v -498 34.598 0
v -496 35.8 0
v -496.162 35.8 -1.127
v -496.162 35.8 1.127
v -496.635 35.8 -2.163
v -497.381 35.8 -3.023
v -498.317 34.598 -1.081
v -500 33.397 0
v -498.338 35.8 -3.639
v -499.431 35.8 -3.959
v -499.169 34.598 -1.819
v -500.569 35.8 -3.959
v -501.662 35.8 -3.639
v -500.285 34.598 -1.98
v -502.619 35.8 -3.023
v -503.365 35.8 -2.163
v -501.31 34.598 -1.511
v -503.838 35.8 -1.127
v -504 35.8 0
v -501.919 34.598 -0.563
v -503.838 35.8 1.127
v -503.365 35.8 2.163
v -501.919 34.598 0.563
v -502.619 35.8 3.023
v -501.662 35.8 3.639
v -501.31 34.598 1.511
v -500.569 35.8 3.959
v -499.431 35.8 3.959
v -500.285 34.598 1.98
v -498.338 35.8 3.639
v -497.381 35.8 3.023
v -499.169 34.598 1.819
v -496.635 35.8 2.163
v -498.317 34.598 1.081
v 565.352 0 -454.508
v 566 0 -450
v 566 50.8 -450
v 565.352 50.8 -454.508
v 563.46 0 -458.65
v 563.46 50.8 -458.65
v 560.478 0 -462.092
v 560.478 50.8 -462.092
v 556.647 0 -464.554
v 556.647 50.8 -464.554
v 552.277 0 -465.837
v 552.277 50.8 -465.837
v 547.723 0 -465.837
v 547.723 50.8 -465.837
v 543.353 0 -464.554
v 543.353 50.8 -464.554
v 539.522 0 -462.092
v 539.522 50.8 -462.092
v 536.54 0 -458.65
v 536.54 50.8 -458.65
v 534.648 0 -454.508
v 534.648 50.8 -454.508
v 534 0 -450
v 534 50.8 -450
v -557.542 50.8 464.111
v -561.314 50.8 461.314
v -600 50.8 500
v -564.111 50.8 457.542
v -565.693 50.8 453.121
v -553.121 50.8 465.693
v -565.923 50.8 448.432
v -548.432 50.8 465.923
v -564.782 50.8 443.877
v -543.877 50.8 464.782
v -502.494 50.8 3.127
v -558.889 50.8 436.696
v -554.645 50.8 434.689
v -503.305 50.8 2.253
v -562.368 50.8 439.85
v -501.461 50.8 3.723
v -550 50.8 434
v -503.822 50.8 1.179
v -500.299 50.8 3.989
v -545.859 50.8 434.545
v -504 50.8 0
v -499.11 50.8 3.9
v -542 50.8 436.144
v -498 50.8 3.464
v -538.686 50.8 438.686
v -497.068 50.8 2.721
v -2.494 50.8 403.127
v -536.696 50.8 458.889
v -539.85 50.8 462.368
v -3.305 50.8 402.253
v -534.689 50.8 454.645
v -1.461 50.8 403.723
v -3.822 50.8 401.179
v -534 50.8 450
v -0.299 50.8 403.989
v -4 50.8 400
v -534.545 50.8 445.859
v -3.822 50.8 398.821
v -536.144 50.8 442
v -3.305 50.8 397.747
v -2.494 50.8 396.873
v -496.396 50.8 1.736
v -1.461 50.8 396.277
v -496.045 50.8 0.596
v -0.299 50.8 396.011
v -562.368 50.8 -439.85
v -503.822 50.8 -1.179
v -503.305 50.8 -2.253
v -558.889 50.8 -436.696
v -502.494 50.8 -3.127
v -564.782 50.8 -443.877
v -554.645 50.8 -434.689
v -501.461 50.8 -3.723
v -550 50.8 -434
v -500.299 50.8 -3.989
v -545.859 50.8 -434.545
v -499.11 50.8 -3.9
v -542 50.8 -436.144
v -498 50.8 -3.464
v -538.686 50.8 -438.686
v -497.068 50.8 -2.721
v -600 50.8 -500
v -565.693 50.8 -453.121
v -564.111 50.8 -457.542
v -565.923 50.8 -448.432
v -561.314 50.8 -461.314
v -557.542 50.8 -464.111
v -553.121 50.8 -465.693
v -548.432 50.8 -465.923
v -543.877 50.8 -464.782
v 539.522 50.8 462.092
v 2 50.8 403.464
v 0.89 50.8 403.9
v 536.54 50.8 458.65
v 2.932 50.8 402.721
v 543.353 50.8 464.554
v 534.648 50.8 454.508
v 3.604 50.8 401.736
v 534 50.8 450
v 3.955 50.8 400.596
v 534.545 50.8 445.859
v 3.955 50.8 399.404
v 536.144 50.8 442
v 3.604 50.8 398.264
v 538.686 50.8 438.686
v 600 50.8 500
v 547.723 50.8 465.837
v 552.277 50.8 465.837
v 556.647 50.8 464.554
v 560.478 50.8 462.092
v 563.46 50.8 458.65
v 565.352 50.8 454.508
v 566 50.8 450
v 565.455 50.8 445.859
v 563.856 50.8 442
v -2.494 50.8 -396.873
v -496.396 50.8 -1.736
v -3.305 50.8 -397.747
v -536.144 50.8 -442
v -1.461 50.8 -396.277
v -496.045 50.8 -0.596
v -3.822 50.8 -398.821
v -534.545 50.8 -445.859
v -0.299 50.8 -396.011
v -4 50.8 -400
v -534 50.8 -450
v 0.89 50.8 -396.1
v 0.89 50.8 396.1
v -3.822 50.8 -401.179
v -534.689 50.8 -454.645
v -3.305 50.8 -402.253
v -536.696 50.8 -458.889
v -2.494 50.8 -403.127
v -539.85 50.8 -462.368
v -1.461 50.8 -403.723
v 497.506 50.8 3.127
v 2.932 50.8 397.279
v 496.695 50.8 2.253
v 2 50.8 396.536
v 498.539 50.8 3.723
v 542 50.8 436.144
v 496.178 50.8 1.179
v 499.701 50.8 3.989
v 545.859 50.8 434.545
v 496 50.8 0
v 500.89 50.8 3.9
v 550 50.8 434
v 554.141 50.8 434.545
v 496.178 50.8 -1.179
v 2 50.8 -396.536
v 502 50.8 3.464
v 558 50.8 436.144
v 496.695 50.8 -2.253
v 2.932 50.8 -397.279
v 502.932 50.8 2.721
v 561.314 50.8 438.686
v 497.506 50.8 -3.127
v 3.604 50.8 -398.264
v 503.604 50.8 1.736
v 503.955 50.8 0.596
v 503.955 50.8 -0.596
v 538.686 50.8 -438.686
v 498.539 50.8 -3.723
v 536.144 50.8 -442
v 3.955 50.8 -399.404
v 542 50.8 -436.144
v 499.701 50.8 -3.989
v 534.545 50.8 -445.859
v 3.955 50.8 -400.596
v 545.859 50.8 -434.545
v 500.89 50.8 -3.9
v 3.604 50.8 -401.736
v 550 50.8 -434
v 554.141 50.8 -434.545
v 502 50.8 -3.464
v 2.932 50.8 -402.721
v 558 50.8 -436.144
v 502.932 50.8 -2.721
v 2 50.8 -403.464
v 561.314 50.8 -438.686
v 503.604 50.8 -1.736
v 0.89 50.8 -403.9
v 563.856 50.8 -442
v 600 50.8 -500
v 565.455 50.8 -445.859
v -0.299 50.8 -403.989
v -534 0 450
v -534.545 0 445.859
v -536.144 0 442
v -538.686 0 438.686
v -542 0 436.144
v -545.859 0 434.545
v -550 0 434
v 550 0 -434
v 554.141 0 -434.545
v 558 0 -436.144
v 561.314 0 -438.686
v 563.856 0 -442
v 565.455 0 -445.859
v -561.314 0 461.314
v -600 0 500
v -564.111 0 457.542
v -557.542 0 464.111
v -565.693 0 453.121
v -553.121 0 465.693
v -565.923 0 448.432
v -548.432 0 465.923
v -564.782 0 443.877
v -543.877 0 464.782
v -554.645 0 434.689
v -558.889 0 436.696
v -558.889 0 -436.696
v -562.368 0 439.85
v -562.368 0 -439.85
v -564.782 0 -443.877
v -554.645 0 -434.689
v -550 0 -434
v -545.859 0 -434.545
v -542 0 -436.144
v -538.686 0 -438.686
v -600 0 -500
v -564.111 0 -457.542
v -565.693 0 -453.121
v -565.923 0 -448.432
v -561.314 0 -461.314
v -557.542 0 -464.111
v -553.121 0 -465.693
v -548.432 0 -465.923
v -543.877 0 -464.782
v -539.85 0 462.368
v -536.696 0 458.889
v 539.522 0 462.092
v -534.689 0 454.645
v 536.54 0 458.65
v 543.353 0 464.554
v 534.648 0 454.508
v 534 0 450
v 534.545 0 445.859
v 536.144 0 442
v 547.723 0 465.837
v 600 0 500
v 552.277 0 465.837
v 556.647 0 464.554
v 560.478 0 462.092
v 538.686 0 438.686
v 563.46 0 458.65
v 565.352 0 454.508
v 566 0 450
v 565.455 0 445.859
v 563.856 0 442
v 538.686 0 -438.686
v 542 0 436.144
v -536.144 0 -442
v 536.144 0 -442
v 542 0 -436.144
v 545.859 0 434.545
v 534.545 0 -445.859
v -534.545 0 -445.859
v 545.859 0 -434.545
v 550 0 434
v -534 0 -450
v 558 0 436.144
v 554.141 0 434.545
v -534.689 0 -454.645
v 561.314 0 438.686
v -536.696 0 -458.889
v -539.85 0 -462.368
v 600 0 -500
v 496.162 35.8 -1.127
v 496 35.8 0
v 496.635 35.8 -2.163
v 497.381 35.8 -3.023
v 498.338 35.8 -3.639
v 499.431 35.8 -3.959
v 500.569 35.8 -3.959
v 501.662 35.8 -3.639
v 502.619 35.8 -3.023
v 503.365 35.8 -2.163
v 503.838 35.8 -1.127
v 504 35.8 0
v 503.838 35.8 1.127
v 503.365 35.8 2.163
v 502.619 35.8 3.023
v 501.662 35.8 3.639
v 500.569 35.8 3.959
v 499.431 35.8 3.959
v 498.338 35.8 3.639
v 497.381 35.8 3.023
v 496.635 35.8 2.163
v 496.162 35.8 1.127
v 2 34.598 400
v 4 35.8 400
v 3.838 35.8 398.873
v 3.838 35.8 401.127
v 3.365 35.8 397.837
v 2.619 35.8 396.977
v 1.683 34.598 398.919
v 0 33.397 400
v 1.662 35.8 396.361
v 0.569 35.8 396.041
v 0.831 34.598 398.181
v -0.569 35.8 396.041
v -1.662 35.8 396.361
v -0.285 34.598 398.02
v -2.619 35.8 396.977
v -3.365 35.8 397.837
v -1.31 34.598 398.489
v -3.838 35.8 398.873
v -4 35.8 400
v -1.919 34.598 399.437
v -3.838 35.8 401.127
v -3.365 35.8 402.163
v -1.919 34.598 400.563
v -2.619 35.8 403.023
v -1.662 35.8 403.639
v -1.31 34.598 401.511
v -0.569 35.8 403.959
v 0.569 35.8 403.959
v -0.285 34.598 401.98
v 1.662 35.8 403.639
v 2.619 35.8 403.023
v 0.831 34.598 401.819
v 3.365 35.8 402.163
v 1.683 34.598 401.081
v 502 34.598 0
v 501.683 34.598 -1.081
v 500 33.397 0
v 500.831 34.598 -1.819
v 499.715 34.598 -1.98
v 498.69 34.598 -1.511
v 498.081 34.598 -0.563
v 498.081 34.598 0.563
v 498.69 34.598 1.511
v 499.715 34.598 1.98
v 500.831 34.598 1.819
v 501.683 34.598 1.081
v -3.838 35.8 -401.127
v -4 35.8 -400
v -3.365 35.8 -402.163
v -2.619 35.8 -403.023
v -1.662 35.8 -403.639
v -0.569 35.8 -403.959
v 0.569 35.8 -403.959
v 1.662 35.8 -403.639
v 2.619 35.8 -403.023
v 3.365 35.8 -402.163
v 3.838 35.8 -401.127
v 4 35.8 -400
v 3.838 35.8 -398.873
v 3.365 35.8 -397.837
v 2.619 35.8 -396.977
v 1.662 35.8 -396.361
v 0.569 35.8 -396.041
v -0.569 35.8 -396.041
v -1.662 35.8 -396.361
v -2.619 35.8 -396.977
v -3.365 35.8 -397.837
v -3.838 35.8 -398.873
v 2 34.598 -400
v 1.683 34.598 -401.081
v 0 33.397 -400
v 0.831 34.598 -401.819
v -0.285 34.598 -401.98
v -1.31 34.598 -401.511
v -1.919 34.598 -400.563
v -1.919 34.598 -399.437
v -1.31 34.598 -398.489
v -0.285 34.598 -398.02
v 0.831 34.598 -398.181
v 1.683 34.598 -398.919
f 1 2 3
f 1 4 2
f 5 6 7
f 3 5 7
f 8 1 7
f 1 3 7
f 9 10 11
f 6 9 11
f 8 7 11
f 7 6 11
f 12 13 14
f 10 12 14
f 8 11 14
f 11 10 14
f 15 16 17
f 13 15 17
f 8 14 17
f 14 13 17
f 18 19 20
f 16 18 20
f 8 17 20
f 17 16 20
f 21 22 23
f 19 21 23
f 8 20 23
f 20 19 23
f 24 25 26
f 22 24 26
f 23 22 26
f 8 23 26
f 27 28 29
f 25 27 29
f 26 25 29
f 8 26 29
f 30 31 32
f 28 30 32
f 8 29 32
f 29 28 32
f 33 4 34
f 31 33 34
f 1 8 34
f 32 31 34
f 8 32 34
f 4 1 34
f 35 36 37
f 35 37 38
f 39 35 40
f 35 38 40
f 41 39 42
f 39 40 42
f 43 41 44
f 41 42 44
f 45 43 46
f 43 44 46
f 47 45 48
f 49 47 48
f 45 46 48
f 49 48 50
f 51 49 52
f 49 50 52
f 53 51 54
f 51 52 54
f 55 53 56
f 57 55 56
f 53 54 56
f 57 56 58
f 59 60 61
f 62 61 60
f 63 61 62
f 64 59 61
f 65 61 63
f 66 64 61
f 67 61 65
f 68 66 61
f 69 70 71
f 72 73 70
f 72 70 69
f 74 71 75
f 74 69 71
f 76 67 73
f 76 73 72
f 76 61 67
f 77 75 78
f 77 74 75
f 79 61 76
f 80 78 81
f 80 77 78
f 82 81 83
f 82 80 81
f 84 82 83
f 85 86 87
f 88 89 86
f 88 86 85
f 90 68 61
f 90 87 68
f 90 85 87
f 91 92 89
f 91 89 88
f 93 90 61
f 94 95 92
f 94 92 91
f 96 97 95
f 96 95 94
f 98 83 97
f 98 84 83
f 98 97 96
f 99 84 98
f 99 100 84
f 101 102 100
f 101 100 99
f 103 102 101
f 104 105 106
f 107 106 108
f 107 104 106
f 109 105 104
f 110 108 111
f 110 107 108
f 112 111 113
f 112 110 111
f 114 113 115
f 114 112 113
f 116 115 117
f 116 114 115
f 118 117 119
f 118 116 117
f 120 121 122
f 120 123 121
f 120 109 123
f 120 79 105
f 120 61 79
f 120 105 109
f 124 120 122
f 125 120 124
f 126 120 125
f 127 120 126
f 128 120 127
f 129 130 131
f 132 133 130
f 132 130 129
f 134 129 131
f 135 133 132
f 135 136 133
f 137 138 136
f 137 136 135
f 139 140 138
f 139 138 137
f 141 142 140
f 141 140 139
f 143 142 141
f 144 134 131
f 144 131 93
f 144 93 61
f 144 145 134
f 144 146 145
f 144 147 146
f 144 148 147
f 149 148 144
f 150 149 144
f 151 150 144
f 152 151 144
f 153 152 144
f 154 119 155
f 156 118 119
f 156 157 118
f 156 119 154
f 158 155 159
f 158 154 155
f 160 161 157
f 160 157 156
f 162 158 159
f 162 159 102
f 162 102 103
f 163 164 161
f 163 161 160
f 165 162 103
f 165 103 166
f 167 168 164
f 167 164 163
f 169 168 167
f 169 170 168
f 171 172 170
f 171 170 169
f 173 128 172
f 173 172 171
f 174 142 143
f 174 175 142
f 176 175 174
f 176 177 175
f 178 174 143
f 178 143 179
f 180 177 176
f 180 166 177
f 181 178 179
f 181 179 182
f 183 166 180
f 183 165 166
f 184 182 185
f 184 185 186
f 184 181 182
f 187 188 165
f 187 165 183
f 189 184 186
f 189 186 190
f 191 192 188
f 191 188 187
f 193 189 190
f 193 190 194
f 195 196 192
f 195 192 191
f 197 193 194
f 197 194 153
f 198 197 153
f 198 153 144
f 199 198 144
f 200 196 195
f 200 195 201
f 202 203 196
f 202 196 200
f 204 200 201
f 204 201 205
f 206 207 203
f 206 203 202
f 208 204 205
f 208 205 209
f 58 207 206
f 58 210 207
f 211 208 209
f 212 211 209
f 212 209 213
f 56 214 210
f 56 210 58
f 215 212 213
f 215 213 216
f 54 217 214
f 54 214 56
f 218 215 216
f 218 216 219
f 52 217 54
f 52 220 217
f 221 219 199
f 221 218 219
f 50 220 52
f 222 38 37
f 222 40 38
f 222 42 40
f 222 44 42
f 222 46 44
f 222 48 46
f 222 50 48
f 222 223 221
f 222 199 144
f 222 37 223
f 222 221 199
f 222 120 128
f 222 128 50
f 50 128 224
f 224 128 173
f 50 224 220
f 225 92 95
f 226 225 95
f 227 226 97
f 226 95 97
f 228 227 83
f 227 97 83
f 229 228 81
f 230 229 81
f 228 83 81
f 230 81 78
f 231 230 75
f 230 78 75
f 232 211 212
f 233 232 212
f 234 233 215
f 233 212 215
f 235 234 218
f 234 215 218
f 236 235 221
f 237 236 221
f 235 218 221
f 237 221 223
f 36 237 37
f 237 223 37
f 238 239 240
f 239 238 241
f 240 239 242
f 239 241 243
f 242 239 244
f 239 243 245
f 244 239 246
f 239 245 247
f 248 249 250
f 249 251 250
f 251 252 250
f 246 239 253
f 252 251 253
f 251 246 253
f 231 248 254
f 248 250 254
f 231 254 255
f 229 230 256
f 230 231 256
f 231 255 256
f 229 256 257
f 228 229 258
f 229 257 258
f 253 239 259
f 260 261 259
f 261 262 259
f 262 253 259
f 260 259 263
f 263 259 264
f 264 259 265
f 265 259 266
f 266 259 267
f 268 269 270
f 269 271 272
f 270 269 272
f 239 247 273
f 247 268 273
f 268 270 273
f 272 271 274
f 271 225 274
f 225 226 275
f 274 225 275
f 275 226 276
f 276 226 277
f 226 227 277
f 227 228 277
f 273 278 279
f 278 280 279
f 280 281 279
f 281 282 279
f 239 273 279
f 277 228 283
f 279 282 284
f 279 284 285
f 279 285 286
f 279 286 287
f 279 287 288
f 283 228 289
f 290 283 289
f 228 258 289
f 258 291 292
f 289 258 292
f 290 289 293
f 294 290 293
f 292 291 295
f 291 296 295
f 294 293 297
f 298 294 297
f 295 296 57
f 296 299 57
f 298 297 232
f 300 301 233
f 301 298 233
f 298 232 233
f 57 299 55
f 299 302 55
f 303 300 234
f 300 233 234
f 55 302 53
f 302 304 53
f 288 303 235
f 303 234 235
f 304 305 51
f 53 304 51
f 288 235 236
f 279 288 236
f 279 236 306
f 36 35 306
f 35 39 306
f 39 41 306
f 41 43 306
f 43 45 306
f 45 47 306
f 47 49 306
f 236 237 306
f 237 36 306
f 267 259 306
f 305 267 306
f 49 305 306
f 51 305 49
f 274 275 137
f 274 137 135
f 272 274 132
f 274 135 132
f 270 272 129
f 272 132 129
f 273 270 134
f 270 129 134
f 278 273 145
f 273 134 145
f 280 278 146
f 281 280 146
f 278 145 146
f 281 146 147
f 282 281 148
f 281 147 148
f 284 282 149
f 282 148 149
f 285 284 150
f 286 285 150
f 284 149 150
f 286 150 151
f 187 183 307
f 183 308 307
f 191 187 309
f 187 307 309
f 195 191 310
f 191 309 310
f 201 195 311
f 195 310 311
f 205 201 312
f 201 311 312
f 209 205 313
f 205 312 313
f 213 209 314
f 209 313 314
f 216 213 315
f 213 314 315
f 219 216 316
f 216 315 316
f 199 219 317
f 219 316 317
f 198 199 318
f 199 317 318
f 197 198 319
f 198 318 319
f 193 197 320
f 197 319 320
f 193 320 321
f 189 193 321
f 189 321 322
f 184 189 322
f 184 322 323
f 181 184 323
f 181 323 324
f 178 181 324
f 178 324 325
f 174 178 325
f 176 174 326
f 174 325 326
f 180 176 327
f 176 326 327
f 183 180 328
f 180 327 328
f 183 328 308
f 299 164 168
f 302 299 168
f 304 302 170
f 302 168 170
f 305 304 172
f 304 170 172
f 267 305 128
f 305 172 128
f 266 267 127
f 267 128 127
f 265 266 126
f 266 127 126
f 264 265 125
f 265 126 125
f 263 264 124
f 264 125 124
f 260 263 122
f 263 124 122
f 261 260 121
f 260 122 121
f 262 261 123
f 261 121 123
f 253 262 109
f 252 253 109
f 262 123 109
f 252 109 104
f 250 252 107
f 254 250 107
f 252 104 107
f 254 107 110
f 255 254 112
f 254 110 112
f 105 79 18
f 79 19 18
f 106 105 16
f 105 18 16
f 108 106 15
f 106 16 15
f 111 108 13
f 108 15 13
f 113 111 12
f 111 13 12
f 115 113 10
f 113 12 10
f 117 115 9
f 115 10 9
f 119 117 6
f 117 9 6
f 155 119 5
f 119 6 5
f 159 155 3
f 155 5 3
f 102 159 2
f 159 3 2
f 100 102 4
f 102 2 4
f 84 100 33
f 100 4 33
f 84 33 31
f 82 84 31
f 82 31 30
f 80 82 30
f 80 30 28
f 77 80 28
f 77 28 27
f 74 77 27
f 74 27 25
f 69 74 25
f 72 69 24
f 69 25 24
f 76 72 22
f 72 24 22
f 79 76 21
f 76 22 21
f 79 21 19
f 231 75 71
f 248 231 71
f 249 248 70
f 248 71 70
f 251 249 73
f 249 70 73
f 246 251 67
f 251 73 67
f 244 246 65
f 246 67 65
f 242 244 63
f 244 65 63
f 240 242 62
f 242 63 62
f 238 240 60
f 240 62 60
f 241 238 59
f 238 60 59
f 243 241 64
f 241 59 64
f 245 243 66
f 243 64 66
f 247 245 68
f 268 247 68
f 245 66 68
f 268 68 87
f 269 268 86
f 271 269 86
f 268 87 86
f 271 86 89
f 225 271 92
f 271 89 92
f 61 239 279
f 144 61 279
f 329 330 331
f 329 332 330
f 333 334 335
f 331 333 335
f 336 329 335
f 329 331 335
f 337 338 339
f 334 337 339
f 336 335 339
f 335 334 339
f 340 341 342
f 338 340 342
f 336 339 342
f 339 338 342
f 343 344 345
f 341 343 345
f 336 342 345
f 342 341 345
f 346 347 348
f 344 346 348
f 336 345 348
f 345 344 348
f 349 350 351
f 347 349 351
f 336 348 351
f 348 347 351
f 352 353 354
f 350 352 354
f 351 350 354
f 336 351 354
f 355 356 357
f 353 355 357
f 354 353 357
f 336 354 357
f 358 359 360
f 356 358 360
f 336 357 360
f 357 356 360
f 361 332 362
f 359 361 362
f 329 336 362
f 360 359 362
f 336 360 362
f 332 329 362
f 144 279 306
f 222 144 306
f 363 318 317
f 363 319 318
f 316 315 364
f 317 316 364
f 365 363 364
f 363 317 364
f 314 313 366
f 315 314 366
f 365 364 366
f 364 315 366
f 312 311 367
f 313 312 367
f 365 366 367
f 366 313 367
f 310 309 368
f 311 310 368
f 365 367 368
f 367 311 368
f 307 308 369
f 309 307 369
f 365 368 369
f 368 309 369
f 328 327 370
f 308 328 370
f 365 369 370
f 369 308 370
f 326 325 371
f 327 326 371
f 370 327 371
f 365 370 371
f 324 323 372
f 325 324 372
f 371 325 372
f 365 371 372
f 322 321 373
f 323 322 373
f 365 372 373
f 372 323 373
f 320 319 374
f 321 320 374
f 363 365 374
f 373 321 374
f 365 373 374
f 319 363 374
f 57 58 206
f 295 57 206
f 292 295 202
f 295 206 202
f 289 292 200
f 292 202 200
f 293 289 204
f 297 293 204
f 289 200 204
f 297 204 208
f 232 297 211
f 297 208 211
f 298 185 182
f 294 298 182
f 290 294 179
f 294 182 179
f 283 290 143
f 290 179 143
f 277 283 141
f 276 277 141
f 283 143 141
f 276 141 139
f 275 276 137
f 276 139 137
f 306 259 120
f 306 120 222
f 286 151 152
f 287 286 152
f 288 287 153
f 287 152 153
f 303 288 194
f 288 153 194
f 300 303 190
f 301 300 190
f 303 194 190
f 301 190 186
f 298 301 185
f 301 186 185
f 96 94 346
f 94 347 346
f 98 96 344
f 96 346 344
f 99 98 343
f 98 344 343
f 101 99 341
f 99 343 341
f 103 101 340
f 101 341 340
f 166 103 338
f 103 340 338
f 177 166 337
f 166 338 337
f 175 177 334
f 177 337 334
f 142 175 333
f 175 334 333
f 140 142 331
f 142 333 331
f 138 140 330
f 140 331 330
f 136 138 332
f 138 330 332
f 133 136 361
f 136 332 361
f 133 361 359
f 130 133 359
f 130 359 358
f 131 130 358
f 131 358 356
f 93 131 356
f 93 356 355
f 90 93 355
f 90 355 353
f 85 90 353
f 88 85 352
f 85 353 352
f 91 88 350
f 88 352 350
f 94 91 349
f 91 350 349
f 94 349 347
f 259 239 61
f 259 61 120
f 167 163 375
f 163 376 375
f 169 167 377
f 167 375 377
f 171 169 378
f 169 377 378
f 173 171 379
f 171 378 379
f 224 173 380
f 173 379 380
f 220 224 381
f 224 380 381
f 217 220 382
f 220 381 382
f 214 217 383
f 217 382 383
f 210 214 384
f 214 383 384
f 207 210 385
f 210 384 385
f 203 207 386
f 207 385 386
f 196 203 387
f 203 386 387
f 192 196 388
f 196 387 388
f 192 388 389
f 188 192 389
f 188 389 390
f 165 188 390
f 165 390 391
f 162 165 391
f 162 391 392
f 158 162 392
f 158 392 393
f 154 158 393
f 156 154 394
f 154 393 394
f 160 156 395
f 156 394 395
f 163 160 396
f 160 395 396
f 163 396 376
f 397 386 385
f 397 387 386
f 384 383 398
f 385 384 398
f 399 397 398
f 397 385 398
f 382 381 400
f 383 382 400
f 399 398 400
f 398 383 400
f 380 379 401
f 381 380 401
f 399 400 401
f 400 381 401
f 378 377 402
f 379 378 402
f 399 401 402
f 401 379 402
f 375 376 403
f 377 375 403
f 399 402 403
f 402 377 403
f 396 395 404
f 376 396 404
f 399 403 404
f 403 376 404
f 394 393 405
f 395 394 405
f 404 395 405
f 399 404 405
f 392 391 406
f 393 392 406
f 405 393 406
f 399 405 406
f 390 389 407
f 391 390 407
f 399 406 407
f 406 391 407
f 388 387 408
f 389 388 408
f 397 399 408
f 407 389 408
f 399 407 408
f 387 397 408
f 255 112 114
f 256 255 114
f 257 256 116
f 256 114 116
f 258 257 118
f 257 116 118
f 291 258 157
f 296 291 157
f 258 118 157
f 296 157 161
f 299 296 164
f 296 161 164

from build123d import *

# Parameters (mm, degrees)
ESBO_O2_W                      = 1200
ESBO_O2_H                      = 1000
RESSALTO_EXTRUS_O1_DEPTH       = 50.8
CORTE_EXTRUS_O1_DEPTH          = 783.675309436
FURO_DE_DI_METRO_8_0_8_1_D     = 8
FURO_DE_DI_METRO_8_0_8_1_DEPTH = 15
FURO_DE_DI_METRO_8_0_8_1_TIP   = 2.403442476


with BuildPart() as part:
    # Esboço2 → Ressalto-extrusão1 (new body)
    with BuildSketch(Plane(origin=(0, 0, 0), x_dir=(1, 0, 0), z_dir=(0, 1, 0))):
        Rectangle(ESBO_O2_W, ESBO_O2_H)
    extrude(amount=RESSALTO_EXTRUS_O1_DEPTH)

    # Esboço3 → Corte-extrusão1 (cut, through all)
    with BuildSketch(Plane(origin=(0, 50.8, 0), x_dir=(1, 0, 0), z_dir=(0, 1, 0))):
        with BuildLine():
            ThreePointArc((-534, 450), (-561.313708499, 461.313708499), (-550, 434))
            Line((-550, 434), (-550, 450))
            Line((-550, 450), (-534, 450))
        make_face()
        with BuildLine():
            Line((-550, 450), (-550, 434))
            ThreePointArc((-550, 434), (-538.686291501, 438.686291501), (-534, 450))
            Line((-534, 450), (-550, 450))
        make_face()
        with BuildLine():
            ThreePointArc((534, 450), (538.686291501, 438.686291501), (550, 434))
            Line((550, 434), (550, 450))
            Line((550, 450), (534, 450))
        make_face()
        with BuildLine():
            Line((550, 450), (550, 434))
            ThreePointArc((550, 434), (561.313708499, 438.686291501), (566, 450))
            ThreePointArc((566, 450), (550, 466), (534, 450))
            Line((534, 450), (550, 450))
        make_face()
        with BuildLine():
            ThreePointArc((550, -434), (538.686291501, -438.686291501), (534, -450))
            Line((534, -450), (550, -450))
            Line((550, -450), (550, -434))
        make_face()
        with BuildLine():
            Line((550, -450), (534, -450))
            ThreePointArc((534, -450), (550, -466), (566, -450))
            ThreePointArc((566, -450), (561.313708499, -438.686291501), (550, -434))
            Line((550, -434), (550, -450))
        make_face()
        with BuildLine():
            Line((-550, -434), (-550, -450))
            Line((-550, -450), (-534, -450))
            ThreePointArc((-534, -450), (-538.686291501, -438.686291501), (-550, -434))
        make_face()
        with BuildLine():
            Line((-534, -450), (-550, -450))
            Line((-550, -450), (-550, -434))
            ThreePointArc((-550, -434), (-561.313708499, -461.313708499), (-534, -450))
        make_face()
    extrude(amount=-CORTE_EXTRUS_O1_DEPTH, mode=Mode.SUBTRACT)

    # Furo de diâmetro Ø8.0 (8)1
    with Locations(Plane(origin=(0, 50.8, 0), x_dir=(1, 0, 0), z_dir=(0, 1, 0))):
        with Locations((-500, 0), (0, 400), (500, 0), (0, -400)):
            Hole(FURO_DE_DI_METRO_8_0_8_1_D / 2, depth=FURO_DE_DI_METRO_8_0_8_1_DEPTH)
            with Locations((0, 0, -(FURO_DE_DI_METRO_8_0_8_1_DEPTH + FURO_DE_DI_METRO_8_0_8_1_TIP / 2))):  # 118° drill point
                Cone(0, FURO_DE_DI_METRO_8_0_8_1_D / 2, FURO_DE_DI_METRO_8_0_8_1_TIP, mode=Mode.SUBTRACT)


solid = part.part
